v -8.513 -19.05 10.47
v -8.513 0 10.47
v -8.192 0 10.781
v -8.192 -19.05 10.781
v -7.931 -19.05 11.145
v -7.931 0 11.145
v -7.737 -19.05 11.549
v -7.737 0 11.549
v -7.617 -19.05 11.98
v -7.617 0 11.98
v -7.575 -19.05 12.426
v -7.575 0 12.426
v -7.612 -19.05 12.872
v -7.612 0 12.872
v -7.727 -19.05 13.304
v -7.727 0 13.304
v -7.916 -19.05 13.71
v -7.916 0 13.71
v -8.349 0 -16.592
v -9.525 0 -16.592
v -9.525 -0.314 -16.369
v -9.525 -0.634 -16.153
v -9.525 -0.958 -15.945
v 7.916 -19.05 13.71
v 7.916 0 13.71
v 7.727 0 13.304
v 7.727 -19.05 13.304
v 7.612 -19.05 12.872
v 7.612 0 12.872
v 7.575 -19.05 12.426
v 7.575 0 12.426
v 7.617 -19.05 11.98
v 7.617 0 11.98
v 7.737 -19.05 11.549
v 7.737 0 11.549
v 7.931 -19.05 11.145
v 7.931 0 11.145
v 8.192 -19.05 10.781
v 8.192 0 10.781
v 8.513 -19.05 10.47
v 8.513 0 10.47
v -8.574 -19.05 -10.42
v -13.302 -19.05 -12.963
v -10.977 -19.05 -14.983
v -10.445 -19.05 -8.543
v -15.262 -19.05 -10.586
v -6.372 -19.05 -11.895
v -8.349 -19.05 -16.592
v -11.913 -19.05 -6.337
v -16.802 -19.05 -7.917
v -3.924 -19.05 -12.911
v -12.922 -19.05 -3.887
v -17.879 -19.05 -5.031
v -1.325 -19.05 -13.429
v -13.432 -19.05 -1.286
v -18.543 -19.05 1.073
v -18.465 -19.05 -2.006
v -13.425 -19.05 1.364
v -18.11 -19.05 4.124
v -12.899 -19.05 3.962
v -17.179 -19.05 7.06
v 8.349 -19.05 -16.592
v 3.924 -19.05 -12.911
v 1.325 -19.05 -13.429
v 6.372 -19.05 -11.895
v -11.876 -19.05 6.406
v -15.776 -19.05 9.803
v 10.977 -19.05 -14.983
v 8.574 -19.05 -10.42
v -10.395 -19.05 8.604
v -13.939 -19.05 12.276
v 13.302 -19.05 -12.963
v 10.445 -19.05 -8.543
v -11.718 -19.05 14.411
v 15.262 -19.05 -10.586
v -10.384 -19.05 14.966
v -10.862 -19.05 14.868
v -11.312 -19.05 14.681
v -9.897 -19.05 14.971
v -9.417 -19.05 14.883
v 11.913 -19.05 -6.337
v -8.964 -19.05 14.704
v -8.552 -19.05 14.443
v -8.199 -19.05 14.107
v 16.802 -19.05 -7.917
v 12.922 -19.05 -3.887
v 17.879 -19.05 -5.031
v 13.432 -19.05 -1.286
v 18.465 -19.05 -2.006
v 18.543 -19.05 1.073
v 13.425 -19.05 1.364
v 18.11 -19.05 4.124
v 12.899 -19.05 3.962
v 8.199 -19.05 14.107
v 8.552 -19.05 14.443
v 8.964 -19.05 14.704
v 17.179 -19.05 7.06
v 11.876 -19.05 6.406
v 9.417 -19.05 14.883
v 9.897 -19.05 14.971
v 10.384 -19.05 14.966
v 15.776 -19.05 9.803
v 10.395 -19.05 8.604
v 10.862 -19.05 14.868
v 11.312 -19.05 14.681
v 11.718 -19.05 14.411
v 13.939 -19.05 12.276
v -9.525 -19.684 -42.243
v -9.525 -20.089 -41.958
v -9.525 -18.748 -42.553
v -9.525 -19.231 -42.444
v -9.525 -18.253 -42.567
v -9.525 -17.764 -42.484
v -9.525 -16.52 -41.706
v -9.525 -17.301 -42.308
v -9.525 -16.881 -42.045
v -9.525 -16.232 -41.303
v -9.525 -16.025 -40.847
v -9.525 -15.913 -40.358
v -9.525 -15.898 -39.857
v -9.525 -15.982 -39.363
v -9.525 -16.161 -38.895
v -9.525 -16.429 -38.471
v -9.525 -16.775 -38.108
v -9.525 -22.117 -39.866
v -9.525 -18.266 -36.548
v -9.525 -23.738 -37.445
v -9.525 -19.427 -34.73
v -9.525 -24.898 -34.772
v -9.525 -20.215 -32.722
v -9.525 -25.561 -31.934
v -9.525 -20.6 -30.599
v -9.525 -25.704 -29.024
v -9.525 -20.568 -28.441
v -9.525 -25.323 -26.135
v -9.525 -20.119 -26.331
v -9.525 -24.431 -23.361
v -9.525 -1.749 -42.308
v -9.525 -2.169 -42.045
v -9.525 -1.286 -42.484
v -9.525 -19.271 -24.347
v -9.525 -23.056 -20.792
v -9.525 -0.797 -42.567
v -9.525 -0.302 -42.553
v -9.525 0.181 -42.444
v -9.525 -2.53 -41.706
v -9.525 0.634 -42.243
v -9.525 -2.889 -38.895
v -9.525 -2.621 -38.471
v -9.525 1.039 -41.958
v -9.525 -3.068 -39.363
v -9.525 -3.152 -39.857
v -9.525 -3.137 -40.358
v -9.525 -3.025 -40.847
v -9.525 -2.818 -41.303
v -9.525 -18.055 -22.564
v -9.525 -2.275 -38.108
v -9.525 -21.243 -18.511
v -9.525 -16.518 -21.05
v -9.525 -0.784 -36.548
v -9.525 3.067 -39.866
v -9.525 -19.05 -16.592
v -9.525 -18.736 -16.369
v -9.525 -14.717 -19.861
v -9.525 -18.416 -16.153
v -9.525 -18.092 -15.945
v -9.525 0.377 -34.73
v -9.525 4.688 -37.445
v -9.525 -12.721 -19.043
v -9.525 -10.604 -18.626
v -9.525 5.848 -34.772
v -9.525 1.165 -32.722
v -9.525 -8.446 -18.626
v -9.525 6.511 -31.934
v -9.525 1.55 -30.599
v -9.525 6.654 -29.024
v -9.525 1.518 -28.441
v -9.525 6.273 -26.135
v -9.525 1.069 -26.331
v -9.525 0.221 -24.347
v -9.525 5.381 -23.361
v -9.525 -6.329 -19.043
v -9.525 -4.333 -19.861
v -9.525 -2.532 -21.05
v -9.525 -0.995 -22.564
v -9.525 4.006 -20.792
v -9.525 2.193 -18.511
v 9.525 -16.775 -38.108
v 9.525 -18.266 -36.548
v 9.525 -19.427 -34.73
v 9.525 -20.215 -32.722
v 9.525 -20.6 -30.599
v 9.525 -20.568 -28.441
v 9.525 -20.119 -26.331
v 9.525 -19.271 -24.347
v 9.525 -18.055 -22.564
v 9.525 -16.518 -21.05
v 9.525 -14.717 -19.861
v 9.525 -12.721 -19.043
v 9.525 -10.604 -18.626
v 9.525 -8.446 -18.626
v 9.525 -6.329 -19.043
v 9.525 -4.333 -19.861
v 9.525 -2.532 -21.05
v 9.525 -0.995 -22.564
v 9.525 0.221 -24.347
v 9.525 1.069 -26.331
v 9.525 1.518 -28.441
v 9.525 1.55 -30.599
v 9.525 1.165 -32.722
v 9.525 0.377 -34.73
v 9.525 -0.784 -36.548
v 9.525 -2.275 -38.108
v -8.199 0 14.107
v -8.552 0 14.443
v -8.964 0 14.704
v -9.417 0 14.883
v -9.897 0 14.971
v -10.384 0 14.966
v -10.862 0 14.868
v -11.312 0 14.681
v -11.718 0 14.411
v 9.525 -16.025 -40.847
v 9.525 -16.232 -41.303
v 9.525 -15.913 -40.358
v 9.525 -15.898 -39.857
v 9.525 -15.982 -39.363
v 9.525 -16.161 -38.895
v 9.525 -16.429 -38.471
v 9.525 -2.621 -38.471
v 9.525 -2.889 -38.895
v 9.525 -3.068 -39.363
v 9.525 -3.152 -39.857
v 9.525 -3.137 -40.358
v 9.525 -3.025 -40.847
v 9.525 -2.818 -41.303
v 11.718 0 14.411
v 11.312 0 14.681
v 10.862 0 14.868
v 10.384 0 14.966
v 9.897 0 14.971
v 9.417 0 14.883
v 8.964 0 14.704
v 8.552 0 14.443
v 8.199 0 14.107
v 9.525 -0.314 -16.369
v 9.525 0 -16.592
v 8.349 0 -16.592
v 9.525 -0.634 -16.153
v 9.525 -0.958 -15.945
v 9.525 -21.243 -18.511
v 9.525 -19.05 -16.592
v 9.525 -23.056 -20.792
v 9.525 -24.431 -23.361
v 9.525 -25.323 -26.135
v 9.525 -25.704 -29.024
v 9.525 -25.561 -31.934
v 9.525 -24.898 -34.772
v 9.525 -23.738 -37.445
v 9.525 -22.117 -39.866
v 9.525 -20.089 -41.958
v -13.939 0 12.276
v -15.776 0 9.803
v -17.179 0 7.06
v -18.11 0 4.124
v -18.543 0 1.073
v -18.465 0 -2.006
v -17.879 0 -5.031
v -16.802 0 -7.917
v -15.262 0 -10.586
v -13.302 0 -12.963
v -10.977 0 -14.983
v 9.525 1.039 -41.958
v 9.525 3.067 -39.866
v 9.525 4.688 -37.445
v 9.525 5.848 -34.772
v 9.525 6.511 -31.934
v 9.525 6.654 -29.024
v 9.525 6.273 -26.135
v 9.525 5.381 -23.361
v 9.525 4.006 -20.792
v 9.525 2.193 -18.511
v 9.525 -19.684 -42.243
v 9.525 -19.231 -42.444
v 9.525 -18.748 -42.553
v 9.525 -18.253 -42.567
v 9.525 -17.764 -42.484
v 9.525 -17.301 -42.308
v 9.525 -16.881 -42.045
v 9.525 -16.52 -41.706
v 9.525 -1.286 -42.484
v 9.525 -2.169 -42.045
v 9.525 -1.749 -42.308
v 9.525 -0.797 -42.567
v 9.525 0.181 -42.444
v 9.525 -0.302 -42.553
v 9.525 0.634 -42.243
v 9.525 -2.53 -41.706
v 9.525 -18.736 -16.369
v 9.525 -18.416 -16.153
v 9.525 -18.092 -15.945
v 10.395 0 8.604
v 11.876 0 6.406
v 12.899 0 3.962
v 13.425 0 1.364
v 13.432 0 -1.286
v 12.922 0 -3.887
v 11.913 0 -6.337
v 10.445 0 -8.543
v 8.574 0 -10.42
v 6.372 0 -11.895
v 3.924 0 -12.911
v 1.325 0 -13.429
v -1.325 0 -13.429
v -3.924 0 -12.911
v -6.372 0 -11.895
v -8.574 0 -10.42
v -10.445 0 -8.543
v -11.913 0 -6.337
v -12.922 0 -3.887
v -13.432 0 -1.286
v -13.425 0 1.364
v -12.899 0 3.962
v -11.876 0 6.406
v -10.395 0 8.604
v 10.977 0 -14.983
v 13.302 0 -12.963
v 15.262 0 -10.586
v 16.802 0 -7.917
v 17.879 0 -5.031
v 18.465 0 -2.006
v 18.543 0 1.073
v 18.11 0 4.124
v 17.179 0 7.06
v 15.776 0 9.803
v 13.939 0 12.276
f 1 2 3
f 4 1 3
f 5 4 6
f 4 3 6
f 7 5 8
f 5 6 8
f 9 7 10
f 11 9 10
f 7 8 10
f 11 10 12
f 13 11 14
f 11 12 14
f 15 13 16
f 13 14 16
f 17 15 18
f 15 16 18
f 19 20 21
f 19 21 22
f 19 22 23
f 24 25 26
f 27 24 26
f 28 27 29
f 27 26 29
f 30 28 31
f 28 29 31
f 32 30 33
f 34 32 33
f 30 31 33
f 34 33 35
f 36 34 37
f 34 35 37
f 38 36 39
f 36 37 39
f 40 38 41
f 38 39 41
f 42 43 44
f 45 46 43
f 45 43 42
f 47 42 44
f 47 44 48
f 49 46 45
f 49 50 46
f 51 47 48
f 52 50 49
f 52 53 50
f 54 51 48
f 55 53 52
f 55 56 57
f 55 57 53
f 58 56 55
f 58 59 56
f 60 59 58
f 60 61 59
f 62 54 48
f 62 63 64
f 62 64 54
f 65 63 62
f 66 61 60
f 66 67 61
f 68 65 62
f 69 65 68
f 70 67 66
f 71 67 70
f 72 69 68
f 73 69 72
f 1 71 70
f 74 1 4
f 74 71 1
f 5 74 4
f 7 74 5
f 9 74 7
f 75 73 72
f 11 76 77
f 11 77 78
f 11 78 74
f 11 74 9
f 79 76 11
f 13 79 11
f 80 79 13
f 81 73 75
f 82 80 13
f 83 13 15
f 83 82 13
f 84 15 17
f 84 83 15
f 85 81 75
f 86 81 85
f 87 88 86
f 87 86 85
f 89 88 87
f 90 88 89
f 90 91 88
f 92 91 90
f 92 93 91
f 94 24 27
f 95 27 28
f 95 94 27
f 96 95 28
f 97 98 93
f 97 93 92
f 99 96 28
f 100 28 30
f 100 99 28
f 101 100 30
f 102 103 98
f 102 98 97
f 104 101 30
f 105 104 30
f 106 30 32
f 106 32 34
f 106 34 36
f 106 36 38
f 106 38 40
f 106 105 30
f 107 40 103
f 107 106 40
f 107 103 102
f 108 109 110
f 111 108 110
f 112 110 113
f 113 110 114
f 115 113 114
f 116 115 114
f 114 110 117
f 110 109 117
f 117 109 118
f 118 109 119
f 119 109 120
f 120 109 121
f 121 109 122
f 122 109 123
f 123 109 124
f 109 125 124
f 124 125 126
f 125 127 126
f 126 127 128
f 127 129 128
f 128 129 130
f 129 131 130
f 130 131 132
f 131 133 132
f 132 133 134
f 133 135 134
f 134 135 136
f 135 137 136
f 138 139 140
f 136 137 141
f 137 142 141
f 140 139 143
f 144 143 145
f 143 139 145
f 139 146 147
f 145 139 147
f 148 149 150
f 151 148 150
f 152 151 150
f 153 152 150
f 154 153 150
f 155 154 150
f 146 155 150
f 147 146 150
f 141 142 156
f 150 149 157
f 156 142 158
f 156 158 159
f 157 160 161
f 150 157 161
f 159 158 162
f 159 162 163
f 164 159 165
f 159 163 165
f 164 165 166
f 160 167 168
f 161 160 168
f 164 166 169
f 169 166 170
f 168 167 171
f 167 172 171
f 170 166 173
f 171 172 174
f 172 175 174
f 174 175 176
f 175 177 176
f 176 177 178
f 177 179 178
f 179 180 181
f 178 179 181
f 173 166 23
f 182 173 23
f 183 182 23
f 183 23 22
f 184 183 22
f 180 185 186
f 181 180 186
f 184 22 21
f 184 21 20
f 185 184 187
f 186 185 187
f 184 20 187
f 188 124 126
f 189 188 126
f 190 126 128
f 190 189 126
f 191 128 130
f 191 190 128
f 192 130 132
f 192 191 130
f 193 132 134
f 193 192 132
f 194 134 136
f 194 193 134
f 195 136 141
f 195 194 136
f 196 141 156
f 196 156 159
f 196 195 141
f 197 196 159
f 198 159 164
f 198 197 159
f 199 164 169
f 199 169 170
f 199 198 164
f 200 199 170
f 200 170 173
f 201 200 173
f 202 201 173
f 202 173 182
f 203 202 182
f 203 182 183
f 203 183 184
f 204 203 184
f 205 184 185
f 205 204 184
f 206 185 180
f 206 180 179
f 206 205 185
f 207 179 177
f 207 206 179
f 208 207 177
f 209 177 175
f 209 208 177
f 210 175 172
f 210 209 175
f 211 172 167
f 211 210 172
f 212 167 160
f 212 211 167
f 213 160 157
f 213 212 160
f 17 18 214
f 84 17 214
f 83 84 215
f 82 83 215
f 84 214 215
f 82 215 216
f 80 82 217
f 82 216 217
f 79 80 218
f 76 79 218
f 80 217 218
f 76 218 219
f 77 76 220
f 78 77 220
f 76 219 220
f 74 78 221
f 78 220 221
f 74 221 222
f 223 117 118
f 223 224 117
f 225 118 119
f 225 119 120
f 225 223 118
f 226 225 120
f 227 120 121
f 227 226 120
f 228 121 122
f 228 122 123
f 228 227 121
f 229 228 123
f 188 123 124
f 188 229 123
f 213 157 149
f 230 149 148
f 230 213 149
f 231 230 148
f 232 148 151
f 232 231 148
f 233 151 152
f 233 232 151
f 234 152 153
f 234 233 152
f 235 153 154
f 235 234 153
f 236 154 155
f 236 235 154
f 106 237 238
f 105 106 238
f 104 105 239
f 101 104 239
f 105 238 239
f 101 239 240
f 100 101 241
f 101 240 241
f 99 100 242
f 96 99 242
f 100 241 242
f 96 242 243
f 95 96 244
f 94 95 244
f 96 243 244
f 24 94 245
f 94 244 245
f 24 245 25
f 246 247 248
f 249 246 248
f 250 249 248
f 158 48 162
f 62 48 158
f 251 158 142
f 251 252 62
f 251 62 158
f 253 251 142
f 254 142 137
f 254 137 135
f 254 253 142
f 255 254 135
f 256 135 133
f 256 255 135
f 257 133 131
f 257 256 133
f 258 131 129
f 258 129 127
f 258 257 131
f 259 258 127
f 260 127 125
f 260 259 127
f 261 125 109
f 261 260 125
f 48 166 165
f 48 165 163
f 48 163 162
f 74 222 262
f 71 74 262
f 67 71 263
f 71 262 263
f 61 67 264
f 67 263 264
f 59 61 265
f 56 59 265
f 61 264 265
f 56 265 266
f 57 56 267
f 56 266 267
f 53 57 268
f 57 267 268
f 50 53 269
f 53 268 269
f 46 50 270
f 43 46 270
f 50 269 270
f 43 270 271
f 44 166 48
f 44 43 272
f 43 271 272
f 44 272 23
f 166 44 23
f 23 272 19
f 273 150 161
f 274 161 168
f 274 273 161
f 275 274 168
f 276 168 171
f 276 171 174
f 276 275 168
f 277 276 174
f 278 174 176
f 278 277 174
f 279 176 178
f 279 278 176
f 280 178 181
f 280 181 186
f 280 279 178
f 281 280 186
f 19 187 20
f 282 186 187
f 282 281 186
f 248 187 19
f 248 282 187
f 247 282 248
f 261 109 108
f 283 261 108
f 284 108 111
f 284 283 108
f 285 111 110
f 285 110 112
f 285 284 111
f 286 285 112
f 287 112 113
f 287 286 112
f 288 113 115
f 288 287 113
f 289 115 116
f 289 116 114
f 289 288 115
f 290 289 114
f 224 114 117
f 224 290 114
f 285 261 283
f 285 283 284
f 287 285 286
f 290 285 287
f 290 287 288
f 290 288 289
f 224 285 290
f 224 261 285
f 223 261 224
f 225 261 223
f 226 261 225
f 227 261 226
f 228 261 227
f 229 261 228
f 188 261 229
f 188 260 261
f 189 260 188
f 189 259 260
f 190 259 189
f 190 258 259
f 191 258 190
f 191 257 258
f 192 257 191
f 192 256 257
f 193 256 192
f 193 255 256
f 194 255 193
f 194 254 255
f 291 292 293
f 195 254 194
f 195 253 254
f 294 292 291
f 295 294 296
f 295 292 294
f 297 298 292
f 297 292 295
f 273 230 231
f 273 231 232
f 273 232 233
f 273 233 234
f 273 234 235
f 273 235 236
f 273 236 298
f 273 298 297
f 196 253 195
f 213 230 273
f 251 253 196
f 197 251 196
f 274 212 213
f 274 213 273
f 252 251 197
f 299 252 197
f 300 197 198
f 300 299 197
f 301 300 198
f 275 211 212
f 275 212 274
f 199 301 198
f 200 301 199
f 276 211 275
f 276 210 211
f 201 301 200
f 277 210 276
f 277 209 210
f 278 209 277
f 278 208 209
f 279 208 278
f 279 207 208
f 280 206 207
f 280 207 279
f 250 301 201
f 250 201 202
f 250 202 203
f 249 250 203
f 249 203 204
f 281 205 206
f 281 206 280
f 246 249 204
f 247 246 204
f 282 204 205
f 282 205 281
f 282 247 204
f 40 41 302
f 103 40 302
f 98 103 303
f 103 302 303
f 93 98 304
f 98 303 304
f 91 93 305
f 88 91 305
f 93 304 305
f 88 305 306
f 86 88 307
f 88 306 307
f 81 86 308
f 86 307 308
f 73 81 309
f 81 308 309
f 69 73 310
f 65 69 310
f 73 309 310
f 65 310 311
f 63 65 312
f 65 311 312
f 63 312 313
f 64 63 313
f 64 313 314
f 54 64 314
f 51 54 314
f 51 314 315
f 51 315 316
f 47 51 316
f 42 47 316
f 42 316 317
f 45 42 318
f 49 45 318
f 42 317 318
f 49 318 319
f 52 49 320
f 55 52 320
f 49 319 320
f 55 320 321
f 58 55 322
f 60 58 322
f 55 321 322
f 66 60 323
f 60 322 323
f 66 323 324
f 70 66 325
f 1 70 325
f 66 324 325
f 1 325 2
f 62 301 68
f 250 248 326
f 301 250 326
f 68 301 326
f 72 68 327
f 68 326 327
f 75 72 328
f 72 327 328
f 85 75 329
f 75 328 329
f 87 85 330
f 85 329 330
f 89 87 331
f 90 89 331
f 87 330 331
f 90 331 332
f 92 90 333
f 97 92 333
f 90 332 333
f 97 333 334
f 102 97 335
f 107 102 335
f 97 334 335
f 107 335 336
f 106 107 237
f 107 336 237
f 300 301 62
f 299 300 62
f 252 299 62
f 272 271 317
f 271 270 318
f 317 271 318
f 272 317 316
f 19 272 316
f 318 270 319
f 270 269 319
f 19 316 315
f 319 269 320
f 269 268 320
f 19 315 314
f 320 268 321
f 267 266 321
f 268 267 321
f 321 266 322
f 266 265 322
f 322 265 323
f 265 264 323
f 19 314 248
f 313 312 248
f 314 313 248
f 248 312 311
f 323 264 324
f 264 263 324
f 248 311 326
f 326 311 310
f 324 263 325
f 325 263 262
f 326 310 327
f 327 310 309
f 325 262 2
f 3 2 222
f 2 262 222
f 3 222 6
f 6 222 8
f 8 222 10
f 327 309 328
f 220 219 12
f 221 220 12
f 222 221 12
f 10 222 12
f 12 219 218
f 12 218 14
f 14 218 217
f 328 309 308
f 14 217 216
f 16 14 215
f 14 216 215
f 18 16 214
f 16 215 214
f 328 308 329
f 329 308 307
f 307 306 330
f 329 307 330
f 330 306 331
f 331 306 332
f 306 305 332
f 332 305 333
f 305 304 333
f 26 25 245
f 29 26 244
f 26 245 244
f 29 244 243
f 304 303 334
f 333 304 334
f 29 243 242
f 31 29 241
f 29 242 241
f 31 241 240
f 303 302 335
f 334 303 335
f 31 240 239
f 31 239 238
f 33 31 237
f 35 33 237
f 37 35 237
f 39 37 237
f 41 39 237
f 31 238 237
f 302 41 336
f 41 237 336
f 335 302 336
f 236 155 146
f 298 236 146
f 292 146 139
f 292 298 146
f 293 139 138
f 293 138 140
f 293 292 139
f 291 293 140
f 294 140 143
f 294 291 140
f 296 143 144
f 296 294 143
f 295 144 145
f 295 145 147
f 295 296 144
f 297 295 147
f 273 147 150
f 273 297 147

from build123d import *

# Parameters (mm, degrees)
F1_DEPTH = 19.05
F3_DEPTH = 9.525
F4_DEPTH = 9.525


with BuildPart() as f1:
    # F0 (on Front) → F1 (new body)
    with BuildSketch(Plane.XZ):
        with BuildLine():
            ThreePointArc((8.512915, 10.469554), (0, -13.49375), (-8.512915, 10.469554))
            ThreePointArc((-8.512915, 10.469554), (-7.617416, 11.979921), (-7.915642, 13.710294))
            ThreePointArc((-7.915642, 13.710294), (-9.654974, 14.938224), (-11.717777, 14.411033))
            ThreePointArc((-11.717777, 14.411033), (0, -18.57375), (11.717777, 14.411033))
            ThreePointArc((11.717777, 14.411033), (9.654974, 14.938224), (7.915642, 13.710294))
            ThreePointArc((7.915642, 13.710294), (7.617416, 11.979921), (8.512915, 10.469554))
        make_face()
    extrude(amount=F1_DEPTH)

    # F2 (on Right) → F3 (join)
    with BuildSketch(Plane.YZ):
        with BuildLine():
            ThreePointArc((-16.7747, -38.108215), (-9.525, -18.57375), (-2.2753, -38.108215))
            ThreePointArc((-2.2753, -38.108215), (-3.122367, -39.607942), (-2.81793, -41.303236))
            ThreePointArc((-2.81793, -41.303236), (-1.043519, -42.537378), (1.038849, -41.958257))
            ThreePointArc((1.038849, -41.958257), (6.653938, -29.02367), (0, -16.59154))
            ThreePointArc((0, -16.59154), (-9.525, -13.49375), (-19.05, -16.59154))
            ThreePointArc((-19.05, -16.59154), (-25.703938, -29.02367), (-20.088849, -41.958257))
            ThreePointArc((-20.088849, -41.958257), (-18.006481, -42.537378), (-16.23207, -41.303236))
            ThreePointArc((-16.23207, -41.303236), (-15.927633, -39.607942), (-16.7747, -38.108215))
        make_face()
    extrude(amount=F3_DEPTH)

    # F2 (on Right) → F4 (join)
    with BuildSketch(Plane.YZ):
        with BuildLine():
            ThreePointArc((-16.7747, -38.108215), (-9.525, -18.57375), (-2.2753, -38.108215))
            ThreePointArc((-2.2753, -38.108215), (-3.122367, -39.607942), (-2.81793, -41.303236))
            ThreePointArc((-2.81793, -41.303236), (-1.043519, -42.537378), (1.038849, -41.958257))
            ThreePointArc((1.038849, -41.958257), (6.653938, -29.02367), (0, -16.59154))
            ThreePointArc((0, -16.59154), (-9.525, -13.49375), (-19.05, -16.59154))
            ThreePointArc((-19.05, -16.59154), (-25.703938, -29.02367), (-20.088849, -41.958257))
            ThreePointArc((-20.088849, -41.958257), (-18.006481, -42.537378), (-16.23207, -41.303236))
            ThreePointArc((-16.23207, -41.303236), (-15.927633, -39.607942), (-16.7747, -38.108215))
        make_face()
    extrude(amount=-F4_DEPTH)


solid = f1.part
